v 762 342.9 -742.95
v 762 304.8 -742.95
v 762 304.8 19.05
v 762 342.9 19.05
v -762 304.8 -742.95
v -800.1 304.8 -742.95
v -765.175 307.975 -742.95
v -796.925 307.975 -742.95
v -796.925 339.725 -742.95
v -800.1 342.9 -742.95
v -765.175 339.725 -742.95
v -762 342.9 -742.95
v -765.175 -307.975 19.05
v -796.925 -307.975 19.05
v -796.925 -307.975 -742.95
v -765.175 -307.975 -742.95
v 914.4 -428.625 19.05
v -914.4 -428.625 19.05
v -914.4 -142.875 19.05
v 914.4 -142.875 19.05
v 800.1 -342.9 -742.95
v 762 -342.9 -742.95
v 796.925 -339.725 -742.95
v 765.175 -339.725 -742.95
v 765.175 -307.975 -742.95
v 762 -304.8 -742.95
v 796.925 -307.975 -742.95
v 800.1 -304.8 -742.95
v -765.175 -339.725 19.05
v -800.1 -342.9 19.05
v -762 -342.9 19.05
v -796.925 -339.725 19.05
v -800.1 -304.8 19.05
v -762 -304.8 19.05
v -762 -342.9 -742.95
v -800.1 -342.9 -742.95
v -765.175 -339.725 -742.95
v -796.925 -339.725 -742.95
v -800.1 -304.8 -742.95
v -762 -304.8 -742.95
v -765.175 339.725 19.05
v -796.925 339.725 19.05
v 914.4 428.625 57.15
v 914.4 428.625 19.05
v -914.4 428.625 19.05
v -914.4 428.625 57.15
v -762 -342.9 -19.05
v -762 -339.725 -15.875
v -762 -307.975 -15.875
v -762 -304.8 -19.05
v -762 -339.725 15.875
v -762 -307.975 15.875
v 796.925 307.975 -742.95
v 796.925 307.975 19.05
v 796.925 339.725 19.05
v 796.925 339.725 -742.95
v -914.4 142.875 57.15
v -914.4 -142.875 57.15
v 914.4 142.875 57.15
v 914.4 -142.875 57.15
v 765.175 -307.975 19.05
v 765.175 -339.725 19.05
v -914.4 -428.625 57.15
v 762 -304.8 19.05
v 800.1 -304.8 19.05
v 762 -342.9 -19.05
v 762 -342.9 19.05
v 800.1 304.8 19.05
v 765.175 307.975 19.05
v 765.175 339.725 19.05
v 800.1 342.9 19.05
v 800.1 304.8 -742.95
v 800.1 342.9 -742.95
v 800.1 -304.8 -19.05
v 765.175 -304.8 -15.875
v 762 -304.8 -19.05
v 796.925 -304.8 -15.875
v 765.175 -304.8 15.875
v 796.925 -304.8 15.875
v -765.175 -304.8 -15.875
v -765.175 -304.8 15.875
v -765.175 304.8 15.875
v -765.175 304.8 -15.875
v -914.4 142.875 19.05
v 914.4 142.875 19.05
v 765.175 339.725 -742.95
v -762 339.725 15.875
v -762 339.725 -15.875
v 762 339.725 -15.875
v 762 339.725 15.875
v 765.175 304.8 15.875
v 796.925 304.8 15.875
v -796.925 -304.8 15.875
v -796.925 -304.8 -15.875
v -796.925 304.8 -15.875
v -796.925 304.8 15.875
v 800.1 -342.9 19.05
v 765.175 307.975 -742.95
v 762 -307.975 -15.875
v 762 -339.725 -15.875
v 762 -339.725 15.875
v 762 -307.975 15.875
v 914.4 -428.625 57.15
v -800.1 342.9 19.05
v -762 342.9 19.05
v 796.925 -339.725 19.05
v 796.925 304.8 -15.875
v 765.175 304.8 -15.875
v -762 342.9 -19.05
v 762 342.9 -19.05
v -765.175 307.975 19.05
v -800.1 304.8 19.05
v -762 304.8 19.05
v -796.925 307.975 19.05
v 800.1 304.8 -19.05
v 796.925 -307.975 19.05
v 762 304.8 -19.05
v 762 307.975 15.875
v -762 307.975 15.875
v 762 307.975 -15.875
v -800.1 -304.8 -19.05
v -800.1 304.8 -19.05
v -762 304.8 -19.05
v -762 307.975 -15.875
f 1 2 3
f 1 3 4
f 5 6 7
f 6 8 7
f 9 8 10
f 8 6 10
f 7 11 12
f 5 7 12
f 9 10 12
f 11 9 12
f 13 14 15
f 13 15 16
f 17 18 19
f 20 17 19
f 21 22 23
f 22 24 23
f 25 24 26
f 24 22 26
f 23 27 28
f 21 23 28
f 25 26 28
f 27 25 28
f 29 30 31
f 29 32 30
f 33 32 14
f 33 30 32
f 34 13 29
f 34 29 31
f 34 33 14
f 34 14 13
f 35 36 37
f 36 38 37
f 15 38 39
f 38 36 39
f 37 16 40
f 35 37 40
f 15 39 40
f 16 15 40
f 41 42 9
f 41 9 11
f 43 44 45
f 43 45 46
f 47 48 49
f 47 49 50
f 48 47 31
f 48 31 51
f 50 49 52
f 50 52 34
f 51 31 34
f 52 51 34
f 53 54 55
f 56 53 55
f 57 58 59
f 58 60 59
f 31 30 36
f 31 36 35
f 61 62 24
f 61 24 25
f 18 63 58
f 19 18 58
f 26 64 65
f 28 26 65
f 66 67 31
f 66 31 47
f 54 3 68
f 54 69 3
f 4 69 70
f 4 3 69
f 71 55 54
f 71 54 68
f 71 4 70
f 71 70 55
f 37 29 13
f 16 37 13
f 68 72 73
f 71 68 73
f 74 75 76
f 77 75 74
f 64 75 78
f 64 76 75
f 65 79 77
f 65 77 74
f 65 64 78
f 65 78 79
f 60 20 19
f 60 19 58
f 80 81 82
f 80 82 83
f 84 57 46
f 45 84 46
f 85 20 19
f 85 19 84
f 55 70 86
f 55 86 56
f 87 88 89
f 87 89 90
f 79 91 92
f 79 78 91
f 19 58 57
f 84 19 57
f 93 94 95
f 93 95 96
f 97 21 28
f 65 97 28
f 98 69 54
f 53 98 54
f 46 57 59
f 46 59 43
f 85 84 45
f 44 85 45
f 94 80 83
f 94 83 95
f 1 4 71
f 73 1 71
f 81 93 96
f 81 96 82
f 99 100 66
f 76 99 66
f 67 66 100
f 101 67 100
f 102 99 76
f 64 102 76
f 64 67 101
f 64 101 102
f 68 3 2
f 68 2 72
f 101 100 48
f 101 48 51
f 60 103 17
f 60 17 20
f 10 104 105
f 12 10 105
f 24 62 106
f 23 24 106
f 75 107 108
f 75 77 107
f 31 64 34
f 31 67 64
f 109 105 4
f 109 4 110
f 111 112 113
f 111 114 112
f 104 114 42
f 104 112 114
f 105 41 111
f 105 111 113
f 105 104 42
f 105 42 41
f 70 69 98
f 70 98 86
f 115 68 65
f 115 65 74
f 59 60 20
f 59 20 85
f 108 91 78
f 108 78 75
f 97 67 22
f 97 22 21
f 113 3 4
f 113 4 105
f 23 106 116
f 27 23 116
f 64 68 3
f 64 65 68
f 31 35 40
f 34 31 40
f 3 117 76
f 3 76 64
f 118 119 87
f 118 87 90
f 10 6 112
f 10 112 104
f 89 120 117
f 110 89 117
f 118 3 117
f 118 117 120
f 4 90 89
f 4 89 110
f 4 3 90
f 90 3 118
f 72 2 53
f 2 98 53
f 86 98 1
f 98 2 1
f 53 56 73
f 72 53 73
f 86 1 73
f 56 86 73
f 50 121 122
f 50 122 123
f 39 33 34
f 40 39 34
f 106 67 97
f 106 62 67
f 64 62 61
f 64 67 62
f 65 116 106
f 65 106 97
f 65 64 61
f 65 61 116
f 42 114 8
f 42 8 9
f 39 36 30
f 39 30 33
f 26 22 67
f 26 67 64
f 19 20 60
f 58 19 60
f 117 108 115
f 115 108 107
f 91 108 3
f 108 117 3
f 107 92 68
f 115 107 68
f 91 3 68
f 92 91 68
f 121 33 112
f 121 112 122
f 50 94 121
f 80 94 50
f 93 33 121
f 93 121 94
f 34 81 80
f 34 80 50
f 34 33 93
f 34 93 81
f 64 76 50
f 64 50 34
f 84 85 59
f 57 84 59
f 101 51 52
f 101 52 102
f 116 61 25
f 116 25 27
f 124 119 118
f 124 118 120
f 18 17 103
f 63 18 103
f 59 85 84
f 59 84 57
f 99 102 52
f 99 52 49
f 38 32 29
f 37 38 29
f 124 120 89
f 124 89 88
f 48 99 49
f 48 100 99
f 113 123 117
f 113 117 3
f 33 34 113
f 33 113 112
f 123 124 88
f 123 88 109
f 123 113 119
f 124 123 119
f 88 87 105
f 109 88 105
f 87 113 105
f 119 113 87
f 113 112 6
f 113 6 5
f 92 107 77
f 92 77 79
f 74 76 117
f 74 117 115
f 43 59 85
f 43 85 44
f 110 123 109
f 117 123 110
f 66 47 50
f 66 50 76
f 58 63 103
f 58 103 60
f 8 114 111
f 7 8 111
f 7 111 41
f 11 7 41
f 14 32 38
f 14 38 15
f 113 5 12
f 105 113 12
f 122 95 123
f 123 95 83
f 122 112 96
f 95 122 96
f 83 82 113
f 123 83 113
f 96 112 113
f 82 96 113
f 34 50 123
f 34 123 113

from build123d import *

# Parameters (mm, degrees)
F3_W           = 38.1
F3_H           = 38.1
F4_DEPTH       = 38.1
F5_W           = 38.1
F5_H           = 38.1
F5_W_2         = 31.75
F5_H_2         = 31.75
F6_DEPTH       = 762
F7_W           = 285.75
F7_H           = 38.1
F8_DEPTH       = 914.4
F8_DEPTH_BACK  = 914.4
F9_W           = 285.75
F9_H           = 38.1
F10_DEPTH      = 914.4
F10_DEPTH_BACK = 914.4


with BuildPart() as f2:
    # F2: sweep along a path in F0
    with BuildLine(Plane.XY) as f2_path:
        Line((-781.05, 323.85), (-781.05, -323.85))
        Line((-781.05, -323.85), (781.05, -323.85))
        Line((781.05, -323.85), (781.05, 323.85))
        Line((781.05, 323.85), (-781.05, 323.85))
    # F1 (on Front) → F2 (sweep)
    with BuildSketch(Plane.XZ):
        Polygon((-762, -19.05), (-762, 0), (-762, 19.05), (-800.1, 19.05), (-800.1, -19.05), align=None)
        Polygon((-765.175, 15.875), (-765.175, 0), (-765.175, -15.875), (-796.925, -15.875), (-796.925, 15.875), align=None, mode=Mode.SUBTRACT)
    sweep(path=f2_path.line, transition=Transition.RIGHT)

    # F3 (on face) → F4 (cut)
    with BuildSketch(Plane.XY.offset(19.05)):
        with Locations((-781.05, 323.85)):
            Rectangle(F3_W, F3_H)
        with Locations((781.05, 323.85)):
            Rectangle(F3_W, F3_H)
        with Locations((781.05, -323.85)):
            Rectangle(F3_W, F3_H)
        with Locations((-781.05, -323.85)):
            Rectangle(F3_W, F3_H)
    extrude(amount=-F4_DEPTH, mode=Mode.SUBTRACT)


with BuildPart() as f6:
    # F5 (on face) → F6 (new body)
    with BuildSketch(Plane.XY.offset(19.05)):
        with Locations((-781.05, 323.85)):
            Rectangle(F5_W, F5_H)
        with Locations((-781.05, 323.85)):
            Rectangle(F5_W_2, F5_H_2, mode=Mode.SUBTRACT)
    extrude(amount=-F6_DEPTH)


with BuildPart() as f6b:
    # F5 (on face) → F6, piece 2 (new body)
    with BuildSketch(Plane.XY.offset(19.05)):
        with Locations((781.05, 323.85)):
            Rectangle(F5_W, F5_H)
        with Locations((781.05, 323.85)):
            Rectangle(F5_W_2, F5_H_2, mode=Mode.SUBTRACT)
    extrude(amount=-F6_DEPTH)


with BuildPart() as f6c:
    # F5 (on face) → F6, piece 3 (new body)
    with BuildSketch(Plane.XY.offset(19.05)):
        with Locations((781.05, -323.85)):
            Rectangle(F5_W, F5_H)
        with Locations((781.05, -323.85)):
            Rectangle(F5_W_2, F5_H_2, mode=Mode.SUBTRACT)
    extrude(amount=-F6_DEPTH)


with BuildPart() as f6d:
    # F5 (on face) → F6, piece 4 (new body)
    with BuildSketch(Plane.XY.offset(19.05)):
        with Locations((-781.05, -323.85)):
            Rectangle(F5_W, F5_H)
        with Locations((-781.05, -323.85)):
            Rectangle(F5_W_2, F5_H_2, mode=Mode.SUBTRACT)
    extrude(amount=-F6_DEPTH)


with BuildPart() as f8:
    # F7 (on Right) → F8 (new body, two sides)
    with BuildSketch(Plane.YZ) as f8_sk:
        with Locations((0, 38.1)):
            Rectangle(F7_W, F7_H)
    extrude(amount=F8_DEPTH)
    extrude(f8_sk.sketch, amount=-F8_DEPTH_BACK)


with BuildPart() as f10:
    # F9 (on Right) → F10 (new body, two sides)
    with BuildSketch(Plane.YZ) as f10_sk:
        with Locations((285.75, 38.1)):
            Rectangle(F9_W, F9_H)
    extrude(amount=F10_DEPTH)
    extrude(f10_sk.sketch, amount=-F10_DEPTH_BACK)


with BuildPart() as f10b:
    # F9 (on Right) → F10, piece 2 (new body, two sides)
    with BuildSketch(Plane.YZ) as f10_2_sk:
        with Locations((-285.75, 38.1)):
            Rectangle(F9_W, F9_H)
    extrude(amount=F10_DEPTH)
    extrude(f10_2_sk.sketch, amount=-F10_DEPTH_BACK)


solid = Compound([f2.part, f6.part, f6b.part, f6c.part, f6d.part, f8.part, f10.part, f10b.part])
